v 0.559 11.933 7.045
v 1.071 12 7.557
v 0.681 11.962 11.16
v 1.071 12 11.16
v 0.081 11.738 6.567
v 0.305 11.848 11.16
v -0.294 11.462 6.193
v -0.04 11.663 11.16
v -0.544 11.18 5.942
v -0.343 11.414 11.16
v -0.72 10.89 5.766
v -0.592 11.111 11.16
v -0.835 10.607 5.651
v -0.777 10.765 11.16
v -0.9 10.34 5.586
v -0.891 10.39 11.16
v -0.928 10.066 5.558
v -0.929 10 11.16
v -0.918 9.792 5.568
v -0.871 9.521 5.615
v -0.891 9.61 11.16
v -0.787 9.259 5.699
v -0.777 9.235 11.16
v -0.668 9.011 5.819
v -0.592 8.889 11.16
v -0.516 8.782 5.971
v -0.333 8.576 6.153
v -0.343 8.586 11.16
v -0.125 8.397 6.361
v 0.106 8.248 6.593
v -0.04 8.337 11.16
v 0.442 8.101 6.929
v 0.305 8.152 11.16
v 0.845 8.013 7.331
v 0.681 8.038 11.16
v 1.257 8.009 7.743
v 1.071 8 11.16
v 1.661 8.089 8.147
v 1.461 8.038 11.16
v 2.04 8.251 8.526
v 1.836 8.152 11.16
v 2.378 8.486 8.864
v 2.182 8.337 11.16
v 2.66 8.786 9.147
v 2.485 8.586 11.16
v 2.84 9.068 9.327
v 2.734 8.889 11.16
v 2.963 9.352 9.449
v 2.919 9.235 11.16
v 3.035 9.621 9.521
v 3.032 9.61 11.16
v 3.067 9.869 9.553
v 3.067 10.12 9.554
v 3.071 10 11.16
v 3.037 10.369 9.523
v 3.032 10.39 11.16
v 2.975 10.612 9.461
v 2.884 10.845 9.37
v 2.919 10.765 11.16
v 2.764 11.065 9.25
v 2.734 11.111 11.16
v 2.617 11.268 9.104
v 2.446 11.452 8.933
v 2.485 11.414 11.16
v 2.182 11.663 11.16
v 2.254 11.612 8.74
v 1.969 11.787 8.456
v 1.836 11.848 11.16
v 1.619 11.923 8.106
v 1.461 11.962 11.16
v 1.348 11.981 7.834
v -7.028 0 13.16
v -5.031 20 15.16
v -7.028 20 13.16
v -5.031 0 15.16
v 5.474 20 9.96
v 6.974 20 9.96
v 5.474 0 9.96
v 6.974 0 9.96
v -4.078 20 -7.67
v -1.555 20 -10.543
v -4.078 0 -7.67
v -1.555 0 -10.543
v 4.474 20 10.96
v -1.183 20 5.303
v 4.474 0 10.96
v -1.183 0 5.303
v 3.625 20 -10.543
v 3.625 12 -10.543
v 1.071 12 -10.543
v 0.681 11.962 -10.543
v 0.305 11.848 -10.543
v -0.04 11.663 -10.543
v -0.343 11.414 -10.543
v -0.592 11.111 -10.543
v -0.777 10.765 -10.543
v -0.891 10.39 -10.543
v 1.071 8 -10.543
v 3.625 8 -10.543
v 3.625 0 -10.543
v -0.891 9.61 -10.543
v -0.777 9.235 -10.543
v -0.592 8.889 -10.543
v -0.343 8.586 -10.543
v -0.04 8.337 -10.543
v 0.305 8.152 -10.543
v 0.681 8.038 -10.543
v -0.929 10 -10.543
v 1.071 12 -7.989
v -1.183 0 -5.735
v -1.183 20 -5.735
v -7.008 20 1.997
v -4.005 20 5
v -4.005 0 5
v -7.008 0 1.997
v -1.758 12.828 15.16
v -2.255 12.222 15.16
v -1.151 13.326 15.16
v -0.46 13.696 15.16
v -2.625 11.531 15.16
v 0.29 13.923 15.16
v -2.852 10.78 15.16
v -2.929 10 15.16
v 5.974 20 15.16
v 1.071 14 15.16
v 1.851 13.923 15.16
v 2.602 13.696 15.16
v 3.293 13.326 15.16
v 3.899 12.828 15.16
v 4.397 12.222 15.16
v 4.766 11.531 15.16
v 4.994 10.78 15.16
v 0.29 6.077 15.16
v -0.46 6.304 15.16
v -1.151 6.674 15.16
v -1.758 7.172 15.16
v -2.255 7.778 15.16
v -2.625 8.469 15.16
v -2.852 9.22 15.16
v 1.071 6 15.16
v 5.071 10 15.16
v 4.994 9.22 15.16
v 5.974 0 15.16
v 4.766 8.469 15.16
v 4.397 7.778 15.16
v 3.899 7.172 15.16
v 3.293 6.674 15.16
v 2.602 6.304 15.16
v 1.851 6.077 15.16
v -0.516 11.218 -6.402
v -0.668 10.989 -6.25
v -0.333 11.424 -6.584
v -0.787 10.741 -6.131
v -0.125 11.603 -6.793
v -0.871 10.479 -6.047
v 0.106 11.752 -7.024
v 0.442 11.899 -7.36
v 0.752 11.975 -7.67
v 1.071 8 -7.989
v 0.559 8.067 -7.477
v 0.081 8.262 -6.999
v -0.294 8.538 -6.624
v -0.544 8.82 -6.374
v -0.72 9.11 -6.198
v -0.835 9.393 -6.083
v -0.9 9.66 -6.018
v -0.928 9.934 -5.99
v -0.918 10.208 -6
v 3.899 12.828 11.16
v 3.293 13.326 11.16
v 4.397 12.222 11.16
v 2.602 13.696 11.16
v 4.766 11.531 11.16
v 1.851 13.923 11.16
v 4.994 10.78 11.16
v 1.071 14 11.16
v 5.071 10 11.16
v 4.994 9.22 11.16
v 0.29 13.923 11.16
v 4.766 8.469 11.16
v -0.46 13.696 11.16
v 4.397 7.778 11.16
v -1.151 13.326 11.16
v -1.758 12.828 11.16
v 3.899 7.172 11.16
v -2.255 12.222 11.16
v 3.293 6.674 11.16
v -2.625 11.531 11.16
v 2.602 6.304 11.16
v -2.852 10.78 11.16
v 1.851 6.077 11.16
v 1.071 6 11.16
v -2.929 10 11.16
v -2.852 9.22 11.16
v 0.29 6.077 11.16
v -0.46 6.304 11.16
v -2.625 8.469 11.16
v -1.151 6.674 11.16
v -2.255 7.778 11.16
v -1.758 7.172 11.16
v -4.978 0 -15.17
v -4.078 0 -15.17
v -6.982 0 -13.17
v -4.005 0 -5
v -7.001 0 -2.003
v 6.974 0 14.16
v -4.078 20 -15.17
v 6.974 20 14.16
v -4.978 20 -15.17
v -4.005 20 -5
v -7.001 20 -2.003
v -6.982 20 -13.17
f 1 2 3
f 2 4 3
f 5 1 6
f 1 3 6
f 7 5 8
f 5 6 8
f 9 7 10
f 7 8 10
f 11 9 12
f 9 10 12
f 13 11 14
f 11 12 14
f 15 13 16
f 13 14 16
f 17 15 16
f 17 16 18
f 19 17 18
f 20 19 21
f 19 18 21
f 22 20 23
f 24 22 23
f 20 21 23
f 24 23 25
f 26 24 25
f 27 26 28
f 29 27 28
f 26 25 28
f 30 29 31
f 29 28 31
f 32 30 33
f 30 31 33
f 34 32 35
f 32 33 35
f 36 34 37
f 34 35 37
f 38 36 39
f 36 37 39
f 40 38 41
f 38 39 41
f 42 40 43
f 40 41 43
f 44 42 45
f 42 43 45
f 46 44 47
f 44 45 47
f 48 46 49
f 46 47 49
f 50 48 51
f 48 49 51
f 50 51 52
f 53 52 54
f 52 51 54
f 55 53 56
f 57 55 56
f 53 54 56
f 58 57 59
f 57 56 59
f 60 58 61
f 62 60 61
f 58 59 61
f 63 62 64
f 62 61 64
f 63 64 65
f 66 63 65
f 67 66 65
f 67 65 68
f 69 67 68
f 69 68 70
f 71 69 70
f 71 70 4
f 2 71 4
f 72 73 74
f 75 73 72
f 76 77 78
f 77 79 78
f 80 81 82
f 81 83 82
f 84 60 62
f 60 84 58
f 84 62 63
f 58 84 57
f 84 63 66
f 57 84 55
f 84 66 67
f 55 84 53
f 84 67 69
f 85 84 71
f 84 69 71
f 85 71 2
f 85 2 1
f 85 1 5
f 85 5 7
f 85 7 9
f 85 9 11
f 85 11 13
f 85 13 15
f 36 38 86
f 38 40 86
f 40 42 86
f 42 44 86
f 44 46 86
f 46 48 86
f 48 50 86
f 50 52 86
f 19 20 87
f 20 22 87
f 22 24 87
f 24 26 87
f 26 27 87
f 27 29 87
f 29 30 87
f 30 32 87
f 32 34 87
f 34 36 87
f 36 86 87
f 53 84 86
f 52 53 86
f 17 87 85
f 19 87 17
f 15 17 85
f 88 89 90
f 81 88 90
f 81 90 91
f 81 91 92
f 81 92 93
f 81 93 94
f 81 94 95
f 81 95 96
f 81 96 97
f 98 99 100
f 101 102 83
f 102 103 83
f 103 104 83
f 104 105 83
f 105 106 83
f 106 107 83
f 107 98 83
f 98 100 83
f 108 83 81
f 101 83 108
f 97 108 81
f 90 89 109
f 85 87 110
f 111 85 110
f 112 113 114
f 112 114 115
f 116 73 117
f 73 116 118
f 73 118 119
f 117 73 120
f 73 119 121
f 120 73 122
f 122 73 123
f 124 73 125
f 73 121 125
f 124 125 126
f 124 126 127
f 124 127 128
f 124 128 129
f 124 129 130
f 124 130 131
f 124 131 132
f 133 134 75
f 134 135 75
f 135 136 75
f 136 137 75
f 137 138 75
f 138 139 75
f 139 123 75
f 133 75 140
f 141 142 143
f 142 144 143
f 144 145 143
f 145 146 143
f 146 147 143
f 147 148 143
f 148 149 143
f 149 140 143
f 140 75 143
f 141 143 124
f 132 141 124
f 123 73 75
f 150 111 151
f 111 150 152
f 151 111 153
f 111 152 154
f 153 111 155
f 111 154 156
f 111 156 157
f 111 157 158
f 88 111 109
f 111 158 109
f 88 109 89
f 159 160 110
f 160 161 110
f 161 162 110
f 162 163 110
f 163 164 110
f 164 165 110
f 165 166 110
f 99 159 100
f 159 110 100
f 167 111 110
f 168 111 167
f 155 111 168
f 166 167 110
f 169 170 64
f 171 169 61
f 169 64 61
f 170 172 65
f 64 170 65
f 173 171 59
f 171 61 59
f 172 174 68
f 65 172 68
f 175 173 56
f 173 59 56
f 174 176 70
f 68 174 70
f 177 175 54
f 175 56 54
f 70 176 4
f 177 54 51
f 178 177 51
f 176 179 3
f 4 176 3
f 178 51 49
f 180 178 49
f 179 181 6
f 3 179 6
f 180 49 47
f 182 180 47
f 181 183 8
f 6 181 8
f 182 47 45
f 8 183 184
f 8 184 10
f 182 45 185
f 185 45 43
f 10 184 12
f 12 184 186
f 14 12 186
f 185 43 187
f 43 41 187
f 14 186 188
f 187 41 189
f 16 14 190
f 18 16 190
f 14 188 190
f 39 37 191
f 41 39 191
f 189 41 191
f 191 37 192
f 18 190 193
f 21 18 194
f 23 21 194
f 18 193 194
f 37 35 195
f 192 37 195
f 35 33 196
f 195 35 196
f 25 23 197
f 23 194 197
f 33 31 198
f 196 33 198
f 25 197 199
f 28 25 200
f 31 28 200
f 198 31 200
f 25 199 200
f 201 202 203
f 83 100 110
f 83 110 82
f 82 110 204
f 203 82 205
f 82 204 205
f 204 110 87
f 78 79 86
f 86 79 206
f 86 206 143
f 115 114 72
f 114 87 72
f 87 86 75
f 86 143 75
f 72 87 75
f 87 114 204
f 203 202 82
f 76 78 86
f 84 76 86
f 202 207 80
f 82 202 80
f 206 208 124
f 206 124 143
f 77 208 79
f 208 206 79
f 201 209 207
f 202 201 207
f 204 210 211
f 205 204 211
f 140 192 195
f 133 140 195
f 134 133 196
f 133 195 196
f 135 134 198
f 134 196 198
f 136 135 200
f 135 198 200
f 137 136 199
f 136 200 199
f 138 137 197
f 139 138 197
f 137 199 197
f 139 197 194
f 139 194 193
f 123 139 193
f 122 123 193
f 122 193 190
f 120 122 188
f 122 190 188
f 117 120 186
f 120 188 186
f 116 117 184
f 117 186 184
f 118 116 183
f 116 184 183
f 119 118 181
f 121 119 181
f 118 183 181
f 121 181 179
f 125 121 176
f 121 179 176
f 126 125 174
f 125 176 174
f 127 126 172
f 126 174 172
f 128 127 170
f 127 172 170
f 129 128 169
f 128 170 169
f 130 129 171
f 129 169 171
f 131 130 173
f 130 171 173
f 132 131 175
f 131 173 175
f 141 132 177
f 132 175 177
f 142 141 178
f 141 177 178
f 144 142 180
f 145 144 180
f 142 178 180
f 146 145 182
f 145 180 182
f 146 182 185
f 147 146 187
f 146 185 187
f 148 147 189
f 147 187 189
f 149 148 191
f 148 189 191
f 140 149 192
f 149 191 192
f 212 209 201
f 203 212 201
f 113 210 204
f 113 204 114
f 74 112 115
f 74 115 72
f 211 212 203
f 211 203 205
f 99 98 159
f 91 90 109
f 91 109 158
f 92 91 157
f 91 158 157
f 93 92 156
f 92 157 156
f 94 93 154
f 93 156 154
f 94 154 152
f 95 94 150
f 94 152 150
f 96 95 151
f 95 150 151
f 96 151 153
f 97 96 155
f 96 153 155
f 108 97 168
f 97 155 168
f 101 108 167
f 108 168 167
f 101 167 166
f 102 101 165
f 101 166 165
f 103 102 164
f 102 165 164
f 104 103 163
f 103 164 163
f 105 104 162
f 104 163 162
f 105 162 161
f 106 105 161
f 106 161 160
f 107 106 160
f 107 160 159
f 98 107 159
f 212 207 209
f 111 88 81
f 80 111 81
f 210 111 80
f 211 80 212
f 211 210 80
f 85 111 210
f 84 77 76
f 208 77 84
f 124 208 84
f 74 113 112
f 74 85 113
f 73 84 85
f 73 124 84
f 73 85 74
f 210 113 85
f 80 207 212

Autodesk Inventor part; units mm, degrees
ref_plane "YZ Plane" through (0, 0, 0) normal (1, 0, 0) x (0, 1, 0)
ref_plane "XZ Plane" through (0, 0, 0) normal (0, 1, 0) x (-1, 0, 0)
ref_plane "XY Plane" through (0, 0, 0) normal (0, 0, 1) x (1, 0, 0)
sketch "Sketch1" plane through (0, 0, 0) normal (0, 1, 0) x (-1, 0, 0)
  line L0 (7.031, 15.16) -> (-6.9736, 15.16)
  line L1 (6.9783, -15.1701) -> (7.031, 15.16)
  line L2 (7.031, 15.16) -> (-7.0217, -15.14) construction
  line L3 (-6.9736, 15.16) -> (6.9783, -15.1701) construction
  line L4 (-5.5, 10.15) -> (-3.5, 10.15) construction
  line L5 (6.9783, -15.1701) -> (4.0783, -15.1701)
  line L6 (4.0783, -15.1701) -> (4.0783, -7.6701)
  line L7 (-5.5, 10.15) -> (-4, 10.15) construction
  line L8 (1.5552, -10.543) -> (4.0783, -7.6701)
  line L9 (-6.9736, 15.16) -> (-6.9736, 9.96)
  line L10 (-6.9736, 9.96) -> (-5.4736, 9.96)
  line L11 (-5.4736, 9.96) -> (-4.4736, 10.96)
  line L12 (-5.4736, 9.96) -> (-4.0594, 9.96) construction
  line L13 (-4.4736, 10.96) -> (1.1832, 5.3031)
  line L14 (1.1832, 5.3031) -> (1.1832, -5.7347)
  line L15 (1.1832, -5.7347) -> (9.1832, -5.7347) construction
  line L16 (1.1832, -5.7347) -> (-3.6251, -10.543)
  line L17 (-3.6251, -10.543) -> (1.5552, -10.543)
  point P0 (0, 0)
  point P1 (-6.5, 10.15)
  dimension "d0" = 14
  dimension "d1" = 30.3
  dimension "d11" = 2.9
  dimension "d12" = 7.5
  dimension "d25" = 41.29
  dimension "d28" = 5.2
  dimension "d29" = 1.5
  dimension "d32" = 4.2
  dimension "d33" = 8
  dimension "d38" = 6.8
  dimension "d40" = 135
  dimension "d41" = 90
  dimension "d42" = 135
extrude "Extrusion1" add sketch "Sketch1" along normal blind 20
chamfer "Chamfer1" distance 2 angle 45 2 edges at (-7.031, 10, 15.16) (-6.9783, 10, -15.1701)
chamfer "Chamfer2" distance 1 angle 45 1 edges at (6.9736, 10, 15.16)
sketch "Sketch3" plane through (3.6251, 0, -10.543) normal (0, 0, -1) x (-1, 0, 0)
  line L0 (0, 0) -> (5.1803, 0) construction
  line L1 (5.1803, 0) -> (5.1803, 20) construction
  line L2 (0, 20) -> (5.1803, 20) construction
  line L3 (0, 0) -> (0, 20) construction
  line L4 (8.6561, 20) -> (-2.3485, 20) construction
  line L5 (5.1803, 0) -> (5.1803, 20) construction
  line L6 (5.1803, 10) -> (2.5543, 10) construction
  point P0 (3.6251, 0)
  dimension "d45" = 2.626
hole "Hole1" at (1.0708, 10, -10.543) direction (0, 0, 1) diameter 4 end through all
sketch "Sketch4" plane through (3.6251, 0, -10.543) normal (0, 0, -1) x (-1, 0, 0)
  circle A0 centre (2.5543, 10) radius 2 construction
  line L0 (2.5543, 8) -> (2.5543, 12)
  circle A1 centre (2.5543, 10) radius 2 construction
  line L1 (2.5543, 8) -> (0, 8)
  line L2 (0, 0) -> (0, 20) projected
  line L3 (0, 8) -> (0, 12)
  line L4 (0, 12) -> (2.5543, 12)
  point P0 (3.6251, 0)
extrude "Extrusion2" cut sketch "Sketch4" against normal blind 5
sketch "Sketch5" plane through (-5.031, 0, 15.16) normal (0, 0, 1) x (1, 0, 0)
  circle A0 centre (6.1018, 10) radius 2 projected
  point P0 (5.031, 0)
hole "Hole2" at (1.0708, 10, 15.16) direction (0, 0, -1) diameter 8 depth 4
sketch "Sketch6" plane through (0, 20, 0) normal (0, 1, 0) x (1, 0, 0)
  line L0 (6.9736, -14.16) -> (5.9736, -15.16) construction
  line L1 (6.9736, -14.16) -> (6.9736, -9.96) construction
  line L2 (6.9736, -9.96) -> (5.4736, -9.96) construction
  line L3 (5.4736, -9.96) -> (4.4736, -10.96) construction
  line L4 (4.4736, -10.96) -> (-1.1832, -5.3031) construction
  line L5 (-1.1832, -5.3031) -> (-1.1832, 5.7347) construction
  line L6 (-1.1832, 5.7347) -> (3.6251, 10.543) construction
  line L7 (3.6251, 10.543) -> (-1.5552, 10.543) construction
  line L8 (-1.5552, 10.543) -> (-4.0783, 7.6701) construction
  line L9 (-4.0783, 7.6701) -> (-4.0783, 15.1701) construction
  line L10 (-4.0783, 15.1701) -> (-4.9783, 15.1701) construction
  line L11 (-6.9817, 13.1701) -> (-4.9783, 15.1701) construction
  line L12 (-6.9817, 13.1701) -> (-7.0275, -13.16) construction
  line L13 (-5.031, -15.16) -> (-7.0275, -13.16) construction
  line L14 (-5.031, -15.16) -> (5.9736, -15.16) construction
  line L15 (-6.9817, 13.1701) -> (-7.0275, -13.16) construction
  line L16 (-7.0275, -13.16) -> (-7.0046, 0.005) construction
  line L17 (-7.0046, 0.005) -> (-4.0046, -0.0002) construction
  line L18 (-4.0046, -0.0002) -> (-4.0046, 4.9998)
  line L19 (-4.0046, -0.0002) -> (0.9954, -0.0002) construction
  line L20 (-4.0046, -0.0002) -> (-4.0046, -5.0002)
  line L21 (-4.0046, -5.0002) -> (-7.0081, -1.9967)
  line L22 (-4.0046, 4.9998) -> (-7.0011, 2.0033)
  line L23 (-7.0081, -1.9967) -> (-7.0011, 2.0033)
  point P0 (0, 0)
  dimension "d63" = 13.165
  dimension "d64" = 3
  dimension "d65" = 5
  dimension "d66" = 90
  dimension "d67" = 5
  dimension "d68" = 45
  dimension "d69" = 45
extrude "Extrusion3" cut sketch "Sketch6" against normal through all
equation "\"d42\" = d40"
equation "\"d69\" = d68"
properties part number "bolt_part"
